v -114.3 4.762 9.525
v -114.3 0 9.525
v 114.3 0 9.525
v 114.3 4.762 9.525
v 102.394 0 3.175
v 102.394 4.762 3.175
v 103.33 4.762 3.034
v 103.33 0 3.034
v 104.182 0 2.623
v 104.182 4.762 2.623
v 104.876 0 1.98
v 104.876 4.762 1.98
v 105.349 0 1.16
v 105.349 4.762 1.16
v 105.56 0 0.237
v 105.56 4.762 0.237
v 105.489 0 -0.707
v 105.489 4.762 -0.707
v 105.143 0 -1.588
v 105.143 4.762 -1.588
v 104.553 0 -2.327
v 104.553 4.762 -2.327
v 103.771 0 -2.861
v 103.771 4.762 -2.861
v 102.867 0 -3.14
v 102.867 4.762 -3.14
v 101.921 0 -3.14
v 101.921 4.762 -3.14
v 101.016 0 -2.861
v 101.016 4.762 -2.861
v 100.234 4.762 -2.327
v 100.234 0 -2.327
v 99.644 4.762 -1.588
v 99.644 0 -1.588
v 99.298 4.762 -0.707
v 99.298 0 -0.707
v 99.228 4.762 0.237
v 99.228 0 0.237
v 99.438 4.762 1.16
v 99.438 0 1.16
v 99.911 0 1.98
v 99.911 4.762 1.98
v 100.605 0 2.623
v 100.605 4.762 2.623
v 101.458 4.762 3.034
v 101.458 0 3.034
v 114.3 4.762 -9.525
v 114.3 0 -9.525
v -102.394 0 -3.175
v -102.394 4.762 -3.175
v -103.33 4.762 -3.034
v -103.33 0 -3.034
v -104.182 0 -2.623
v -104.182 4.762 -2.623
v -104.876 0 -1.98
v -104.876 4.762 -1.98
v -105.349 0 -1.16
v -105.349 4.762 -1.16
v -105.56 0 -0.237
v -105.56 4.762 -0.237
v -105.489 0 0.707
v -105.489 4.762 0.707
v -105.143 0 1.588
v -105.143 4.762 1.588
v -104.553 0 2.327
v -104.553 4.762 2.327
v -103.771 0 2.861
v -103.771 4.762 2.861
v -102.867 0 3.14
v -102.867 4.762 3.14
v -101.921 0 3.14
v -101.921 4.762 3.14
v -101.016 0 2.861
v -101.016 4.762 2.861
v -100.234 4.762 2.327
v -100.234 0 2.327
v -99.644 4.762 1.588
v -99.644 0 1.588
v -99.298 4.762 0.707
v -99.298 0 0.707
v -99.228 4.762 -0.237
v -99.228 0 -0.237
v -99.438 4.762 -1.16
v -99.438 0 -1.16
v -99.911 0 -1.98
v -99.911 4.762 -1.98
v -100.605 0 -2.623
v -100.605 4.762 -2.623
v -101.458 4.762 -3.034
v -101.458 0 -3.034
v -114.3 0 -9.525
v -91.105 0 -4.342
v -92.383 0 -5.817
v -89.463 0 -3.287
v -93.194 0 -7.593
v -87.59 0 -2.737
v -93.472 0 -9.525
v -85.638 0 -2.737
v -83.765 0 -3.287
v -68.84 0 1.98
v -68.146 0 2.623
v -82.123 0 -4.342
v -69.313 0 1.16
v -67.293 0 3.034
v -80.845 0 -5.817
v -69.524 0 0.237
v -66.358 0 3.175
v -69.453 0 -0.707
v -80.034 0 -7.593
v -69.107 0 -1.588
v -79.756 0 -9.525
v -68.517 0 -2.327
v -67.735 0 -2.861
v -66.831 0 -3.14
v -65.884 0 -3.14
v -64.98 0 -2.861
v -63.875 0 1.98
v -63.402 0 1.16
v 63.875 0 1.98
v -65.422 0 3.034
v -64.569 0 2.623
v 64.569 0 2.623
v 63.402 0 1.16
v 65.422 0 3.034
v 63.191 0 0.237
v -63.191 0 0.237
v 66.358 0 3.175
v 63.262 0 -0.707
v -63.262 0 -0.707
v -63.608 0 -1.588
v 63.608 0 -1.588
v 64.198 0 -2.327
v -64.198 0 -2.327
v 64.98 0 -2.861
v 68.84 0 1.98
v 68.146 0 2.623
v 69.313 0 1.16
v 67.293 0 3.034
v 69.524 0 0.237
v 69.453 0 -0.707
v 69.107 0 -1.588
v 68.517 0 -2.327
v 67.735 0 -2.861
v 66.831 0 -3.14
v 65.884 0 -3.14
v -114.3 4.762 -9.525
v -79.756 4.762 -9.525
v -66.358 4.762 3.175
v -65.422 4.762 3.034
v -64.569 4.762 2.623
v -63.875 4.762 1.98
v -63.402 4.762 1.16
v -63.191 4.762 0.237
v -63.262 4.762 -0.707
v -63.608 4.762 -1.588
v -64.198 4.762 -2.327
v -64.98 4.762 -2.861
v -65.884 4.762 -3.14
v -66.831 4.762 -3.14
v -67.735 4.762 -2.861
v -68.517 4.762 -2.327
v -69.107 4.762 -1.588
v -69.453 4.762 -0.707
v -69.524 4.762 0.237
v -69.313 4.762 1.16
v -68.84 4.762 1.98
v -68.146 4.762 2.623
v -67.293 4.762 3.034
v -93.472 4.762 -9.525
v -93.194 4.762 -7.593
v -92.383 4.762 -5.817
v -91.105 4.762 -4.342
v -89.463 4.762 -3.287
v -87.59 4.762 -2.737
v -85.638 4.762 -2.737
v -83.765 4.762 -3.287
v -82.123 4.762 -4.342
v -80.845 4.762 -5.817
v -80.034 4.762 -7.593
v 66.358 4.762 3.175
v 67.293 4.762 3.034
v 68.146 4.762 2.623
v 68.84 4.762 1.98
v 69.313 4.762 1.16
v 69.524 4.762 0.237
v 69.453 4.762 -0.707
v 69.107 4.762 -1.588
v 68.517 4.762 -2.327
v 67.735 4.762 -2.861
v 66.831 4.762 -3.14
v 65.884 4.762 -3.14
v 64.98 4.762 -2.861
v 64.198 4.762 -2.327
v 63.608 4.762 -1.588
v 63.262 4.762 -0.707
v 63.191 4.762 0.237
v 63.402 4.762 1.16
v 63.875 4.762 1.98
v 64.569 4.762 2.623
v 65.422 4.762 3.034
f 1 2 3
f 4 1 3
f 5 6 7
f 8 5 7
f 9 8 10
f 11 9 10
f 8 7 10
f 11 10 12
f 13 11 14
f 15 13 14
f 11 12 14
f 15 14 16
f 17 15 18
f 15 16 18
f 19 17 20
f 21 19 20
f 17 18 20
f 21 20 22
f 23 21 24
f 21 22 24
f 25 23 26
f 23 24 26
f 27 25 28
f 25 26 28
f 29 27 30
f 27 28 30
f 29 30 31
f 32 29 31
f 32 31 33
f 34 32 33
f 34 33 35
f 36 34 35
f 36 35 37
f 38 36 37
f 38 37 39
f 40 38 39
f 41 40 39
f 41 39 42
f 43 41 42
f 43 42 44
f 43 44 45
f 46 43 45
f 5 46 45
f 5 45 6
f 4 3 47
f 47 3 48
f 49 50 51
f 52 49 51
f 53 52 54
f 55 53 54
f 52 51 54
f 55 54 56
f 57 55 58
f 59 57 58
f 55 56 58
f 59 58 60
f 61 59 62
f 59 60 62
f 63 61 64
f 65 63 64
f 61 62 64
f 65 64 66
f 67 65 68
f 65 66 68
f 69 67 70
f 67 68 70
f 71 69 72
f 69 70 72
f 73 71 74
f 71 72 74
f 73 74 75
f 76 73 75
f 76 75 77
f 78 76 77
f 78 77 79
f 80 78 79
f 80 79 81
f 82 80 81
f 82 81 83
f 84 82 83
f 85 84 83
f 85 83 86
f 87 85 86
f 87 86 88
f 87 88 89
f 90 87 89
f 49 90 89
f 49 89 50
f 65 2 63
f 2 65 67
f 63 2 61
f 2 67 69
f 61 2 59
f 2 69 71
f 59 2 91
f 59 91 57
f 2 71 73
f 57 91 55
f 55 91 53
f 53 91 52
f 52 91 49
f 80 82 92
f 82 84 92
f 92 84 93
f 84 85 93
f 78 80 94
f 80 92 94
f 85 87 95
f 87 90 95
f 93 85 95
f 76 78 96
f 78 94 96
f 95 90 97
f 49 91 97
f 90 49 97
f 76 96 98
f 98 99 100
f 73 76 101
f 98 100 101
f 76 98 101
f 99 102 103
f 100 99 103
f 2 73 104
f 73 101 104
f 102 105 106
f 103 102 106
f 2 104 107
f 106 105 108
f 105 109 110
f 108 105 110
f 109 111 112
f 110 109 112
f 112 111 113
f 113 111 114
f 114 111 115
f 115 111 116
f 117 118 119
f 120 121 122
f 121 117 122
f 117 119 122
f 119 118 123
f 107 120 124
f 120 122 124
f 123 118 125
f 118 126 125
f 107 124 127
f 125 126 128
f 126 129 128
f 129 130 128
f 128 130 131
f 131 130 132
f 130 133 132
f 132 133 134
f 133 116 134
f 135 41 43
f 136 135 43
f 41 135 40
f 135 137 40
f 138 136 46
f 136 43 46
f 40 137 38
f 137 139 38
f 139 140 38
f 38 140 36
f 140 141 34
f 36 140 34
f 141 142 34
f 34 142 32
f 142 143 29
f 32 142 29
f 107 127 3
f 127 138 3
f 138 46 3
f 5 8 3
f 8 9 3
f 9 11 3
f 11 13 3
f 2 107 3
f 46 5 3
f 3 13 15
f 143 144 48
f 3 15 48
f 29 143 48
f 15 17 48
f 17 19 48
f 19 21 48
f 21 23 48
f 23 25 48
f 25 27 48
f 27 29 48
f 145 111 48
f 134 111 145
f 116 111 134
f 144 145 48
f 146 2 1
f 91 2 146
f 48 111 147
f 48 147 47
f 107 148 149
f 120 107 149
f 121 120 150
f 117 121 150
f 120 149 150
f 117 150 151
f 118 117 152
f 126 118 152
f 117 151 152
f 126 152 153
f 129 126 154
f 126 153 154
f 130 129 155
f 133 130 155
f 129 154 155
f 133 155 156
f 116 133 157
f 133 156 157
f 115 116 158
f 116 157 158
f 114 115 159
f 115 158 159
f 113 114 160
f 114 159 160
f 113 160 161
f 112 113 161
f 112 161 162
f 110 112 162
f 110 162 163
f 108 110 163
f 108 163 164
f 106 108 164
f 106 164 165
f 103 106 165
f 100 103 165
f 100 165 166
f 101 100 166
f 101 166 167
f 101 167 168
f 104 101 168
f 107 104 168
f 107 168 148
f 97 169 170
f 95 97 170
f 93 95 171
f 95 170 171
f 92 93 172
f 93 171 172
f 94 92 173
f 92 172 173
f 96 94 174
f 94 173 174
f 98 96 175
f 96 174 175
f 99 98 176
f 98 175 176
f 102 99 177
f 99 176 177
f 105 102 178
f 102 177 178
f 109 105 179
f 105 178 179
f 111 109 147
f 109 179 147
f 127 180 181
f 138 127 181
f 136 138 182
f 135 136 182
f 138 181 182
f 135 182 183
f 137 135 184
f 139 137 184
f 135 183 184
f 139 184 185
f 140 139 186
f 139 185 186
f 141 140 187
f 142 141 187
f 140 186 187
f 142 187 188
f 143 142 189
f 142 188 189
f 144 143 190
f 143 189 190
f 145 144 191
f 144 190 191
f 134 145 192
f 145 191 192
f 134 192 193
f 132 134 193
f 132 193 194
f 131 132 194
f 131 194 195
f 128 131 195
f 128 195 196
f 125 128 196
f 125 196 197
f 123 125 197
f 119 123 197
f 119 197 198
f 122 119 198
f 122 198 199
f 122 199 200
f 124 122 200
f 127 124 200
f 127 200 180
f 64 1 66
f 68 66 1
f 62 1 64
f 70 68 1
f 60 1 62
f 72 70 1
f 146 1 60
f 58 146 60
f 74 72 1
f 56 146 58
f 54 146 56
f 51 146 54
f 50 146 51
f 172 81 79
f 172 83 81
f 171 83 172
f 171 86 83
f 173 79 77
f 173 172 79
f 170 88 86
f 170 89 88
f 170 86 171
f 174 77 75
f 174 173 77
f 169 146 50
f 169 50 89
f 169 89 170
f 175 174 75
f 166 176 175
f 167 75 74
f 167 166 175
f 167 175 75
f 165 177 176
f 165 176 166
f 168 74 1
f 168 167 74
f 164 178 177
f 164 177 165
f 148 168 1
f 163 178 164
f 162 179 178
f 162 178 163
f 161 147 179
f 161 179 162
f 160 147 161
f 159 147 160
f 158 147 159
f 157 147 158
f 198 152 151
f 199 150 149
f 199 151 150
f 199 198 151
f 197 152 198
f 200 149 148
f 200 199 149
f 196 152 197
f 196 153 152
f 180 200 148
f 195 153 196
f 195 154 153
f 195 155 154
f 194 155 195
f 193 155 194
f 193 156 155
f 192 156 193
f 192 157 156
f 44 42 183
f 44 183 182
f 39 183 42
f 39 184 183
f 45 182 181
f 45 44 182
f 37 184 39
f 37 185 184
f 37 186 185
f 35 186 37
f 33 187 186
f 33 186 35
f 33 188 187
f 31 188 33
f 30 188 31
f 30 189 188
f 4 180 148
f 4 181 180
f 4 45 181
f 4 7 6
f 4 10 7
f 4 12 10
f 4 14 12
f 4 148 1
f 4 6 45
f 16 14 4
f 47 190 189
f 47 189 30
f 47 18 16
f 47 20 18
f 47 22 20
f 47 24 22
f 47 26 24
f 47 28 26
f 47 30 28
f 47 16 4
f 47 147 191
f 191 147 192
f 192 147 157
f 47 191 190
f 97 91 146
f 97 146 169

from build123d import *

# Parameters (mm, degrees)
SKETCH1_W           = 228.6
SKETCH1_H           = 19.05
BOSS_EXTRUDE1_DEPTH = 4.7625
SKETCH2_R           = 3.175
CUT_EXTRUDE1_DEPTH  = 5.7625
SKETCH3_R           = 6.858
CUT_EXTRUDE2_DEPTH  = 5.7625
SKETCH4_R           = 3.175
CUT_EXTRUDE3_DEPTH  = 5.7625


with BuildPart() as part:
    # Sketch1 → Boss-Extrude1 (new body)
    with BuildSketch(Plane(origin=(0, 0, 0), x_dir=(1, 0, 0), z_dir=(0, 1, 0))):
        Rectangle(SKETCH1_W, SKETCH1_H)
    extrude(amount=BOSS_EXTRUDE1_DEPTH)

    # Sketch2 → Cut-Extrude1 (cut, through all)
    with BuildSketch(Plane(origin=(0, 4.7625, 0), x_dir=(1, 0, 0), z_dir=(0, 1, 0))):
        with Locations(Location((102.39375, 0, 0), (0, 0, 270))):  # turned: the seam where the file's is
            Circle(SKETCH2_R)
        with Locations(Location((-102.39375, 0, 0), (0, 0, 90))):  # turned: the seam where the file's is
            Circle(SKETCH2_R)
    extrude(amount=-CUT_EXTRUDE1_DEPTH, mode=Mode.SUBTRACT)

    # Sketch3 → Cut-Extrude2 (cut, through all)
    with BuildSketch(Plane(origin=(0, 4.7625, 0), x_dir=(1, 0, 0), z_dir=(0, 1, 0))):
        with Locations((-86.614, 9.525)):
            Circle(SKETCH3_R)
    extrude(amount=-CUT_EXTRUDE2_DEPTH, mode=Mode.SUBTRACT)

    # Sketch4 → Cut-Extrude3 (cut, through all)
    with BuildSketch(Plane(origin=(0, 4.7625, 0), x_dir=(1, 0, 0), z_dir=(0, 1, 0))):
        with Locations(Location((-66.3575, 0, 0), (0, 0, 270))):  # turned: the seam where the file's is
            Circle(SKETCH4_R)
        with Locations(Location((66.3575, 0, 0), (0, 0, 270))):  # turned: the seam where the file's is
            Circle(SKETCH4_R)
    extrude(amount=-CUT_EXTRUDE3_DEPTH, mode=Mode.SUBTRACT)


solid = part.part
